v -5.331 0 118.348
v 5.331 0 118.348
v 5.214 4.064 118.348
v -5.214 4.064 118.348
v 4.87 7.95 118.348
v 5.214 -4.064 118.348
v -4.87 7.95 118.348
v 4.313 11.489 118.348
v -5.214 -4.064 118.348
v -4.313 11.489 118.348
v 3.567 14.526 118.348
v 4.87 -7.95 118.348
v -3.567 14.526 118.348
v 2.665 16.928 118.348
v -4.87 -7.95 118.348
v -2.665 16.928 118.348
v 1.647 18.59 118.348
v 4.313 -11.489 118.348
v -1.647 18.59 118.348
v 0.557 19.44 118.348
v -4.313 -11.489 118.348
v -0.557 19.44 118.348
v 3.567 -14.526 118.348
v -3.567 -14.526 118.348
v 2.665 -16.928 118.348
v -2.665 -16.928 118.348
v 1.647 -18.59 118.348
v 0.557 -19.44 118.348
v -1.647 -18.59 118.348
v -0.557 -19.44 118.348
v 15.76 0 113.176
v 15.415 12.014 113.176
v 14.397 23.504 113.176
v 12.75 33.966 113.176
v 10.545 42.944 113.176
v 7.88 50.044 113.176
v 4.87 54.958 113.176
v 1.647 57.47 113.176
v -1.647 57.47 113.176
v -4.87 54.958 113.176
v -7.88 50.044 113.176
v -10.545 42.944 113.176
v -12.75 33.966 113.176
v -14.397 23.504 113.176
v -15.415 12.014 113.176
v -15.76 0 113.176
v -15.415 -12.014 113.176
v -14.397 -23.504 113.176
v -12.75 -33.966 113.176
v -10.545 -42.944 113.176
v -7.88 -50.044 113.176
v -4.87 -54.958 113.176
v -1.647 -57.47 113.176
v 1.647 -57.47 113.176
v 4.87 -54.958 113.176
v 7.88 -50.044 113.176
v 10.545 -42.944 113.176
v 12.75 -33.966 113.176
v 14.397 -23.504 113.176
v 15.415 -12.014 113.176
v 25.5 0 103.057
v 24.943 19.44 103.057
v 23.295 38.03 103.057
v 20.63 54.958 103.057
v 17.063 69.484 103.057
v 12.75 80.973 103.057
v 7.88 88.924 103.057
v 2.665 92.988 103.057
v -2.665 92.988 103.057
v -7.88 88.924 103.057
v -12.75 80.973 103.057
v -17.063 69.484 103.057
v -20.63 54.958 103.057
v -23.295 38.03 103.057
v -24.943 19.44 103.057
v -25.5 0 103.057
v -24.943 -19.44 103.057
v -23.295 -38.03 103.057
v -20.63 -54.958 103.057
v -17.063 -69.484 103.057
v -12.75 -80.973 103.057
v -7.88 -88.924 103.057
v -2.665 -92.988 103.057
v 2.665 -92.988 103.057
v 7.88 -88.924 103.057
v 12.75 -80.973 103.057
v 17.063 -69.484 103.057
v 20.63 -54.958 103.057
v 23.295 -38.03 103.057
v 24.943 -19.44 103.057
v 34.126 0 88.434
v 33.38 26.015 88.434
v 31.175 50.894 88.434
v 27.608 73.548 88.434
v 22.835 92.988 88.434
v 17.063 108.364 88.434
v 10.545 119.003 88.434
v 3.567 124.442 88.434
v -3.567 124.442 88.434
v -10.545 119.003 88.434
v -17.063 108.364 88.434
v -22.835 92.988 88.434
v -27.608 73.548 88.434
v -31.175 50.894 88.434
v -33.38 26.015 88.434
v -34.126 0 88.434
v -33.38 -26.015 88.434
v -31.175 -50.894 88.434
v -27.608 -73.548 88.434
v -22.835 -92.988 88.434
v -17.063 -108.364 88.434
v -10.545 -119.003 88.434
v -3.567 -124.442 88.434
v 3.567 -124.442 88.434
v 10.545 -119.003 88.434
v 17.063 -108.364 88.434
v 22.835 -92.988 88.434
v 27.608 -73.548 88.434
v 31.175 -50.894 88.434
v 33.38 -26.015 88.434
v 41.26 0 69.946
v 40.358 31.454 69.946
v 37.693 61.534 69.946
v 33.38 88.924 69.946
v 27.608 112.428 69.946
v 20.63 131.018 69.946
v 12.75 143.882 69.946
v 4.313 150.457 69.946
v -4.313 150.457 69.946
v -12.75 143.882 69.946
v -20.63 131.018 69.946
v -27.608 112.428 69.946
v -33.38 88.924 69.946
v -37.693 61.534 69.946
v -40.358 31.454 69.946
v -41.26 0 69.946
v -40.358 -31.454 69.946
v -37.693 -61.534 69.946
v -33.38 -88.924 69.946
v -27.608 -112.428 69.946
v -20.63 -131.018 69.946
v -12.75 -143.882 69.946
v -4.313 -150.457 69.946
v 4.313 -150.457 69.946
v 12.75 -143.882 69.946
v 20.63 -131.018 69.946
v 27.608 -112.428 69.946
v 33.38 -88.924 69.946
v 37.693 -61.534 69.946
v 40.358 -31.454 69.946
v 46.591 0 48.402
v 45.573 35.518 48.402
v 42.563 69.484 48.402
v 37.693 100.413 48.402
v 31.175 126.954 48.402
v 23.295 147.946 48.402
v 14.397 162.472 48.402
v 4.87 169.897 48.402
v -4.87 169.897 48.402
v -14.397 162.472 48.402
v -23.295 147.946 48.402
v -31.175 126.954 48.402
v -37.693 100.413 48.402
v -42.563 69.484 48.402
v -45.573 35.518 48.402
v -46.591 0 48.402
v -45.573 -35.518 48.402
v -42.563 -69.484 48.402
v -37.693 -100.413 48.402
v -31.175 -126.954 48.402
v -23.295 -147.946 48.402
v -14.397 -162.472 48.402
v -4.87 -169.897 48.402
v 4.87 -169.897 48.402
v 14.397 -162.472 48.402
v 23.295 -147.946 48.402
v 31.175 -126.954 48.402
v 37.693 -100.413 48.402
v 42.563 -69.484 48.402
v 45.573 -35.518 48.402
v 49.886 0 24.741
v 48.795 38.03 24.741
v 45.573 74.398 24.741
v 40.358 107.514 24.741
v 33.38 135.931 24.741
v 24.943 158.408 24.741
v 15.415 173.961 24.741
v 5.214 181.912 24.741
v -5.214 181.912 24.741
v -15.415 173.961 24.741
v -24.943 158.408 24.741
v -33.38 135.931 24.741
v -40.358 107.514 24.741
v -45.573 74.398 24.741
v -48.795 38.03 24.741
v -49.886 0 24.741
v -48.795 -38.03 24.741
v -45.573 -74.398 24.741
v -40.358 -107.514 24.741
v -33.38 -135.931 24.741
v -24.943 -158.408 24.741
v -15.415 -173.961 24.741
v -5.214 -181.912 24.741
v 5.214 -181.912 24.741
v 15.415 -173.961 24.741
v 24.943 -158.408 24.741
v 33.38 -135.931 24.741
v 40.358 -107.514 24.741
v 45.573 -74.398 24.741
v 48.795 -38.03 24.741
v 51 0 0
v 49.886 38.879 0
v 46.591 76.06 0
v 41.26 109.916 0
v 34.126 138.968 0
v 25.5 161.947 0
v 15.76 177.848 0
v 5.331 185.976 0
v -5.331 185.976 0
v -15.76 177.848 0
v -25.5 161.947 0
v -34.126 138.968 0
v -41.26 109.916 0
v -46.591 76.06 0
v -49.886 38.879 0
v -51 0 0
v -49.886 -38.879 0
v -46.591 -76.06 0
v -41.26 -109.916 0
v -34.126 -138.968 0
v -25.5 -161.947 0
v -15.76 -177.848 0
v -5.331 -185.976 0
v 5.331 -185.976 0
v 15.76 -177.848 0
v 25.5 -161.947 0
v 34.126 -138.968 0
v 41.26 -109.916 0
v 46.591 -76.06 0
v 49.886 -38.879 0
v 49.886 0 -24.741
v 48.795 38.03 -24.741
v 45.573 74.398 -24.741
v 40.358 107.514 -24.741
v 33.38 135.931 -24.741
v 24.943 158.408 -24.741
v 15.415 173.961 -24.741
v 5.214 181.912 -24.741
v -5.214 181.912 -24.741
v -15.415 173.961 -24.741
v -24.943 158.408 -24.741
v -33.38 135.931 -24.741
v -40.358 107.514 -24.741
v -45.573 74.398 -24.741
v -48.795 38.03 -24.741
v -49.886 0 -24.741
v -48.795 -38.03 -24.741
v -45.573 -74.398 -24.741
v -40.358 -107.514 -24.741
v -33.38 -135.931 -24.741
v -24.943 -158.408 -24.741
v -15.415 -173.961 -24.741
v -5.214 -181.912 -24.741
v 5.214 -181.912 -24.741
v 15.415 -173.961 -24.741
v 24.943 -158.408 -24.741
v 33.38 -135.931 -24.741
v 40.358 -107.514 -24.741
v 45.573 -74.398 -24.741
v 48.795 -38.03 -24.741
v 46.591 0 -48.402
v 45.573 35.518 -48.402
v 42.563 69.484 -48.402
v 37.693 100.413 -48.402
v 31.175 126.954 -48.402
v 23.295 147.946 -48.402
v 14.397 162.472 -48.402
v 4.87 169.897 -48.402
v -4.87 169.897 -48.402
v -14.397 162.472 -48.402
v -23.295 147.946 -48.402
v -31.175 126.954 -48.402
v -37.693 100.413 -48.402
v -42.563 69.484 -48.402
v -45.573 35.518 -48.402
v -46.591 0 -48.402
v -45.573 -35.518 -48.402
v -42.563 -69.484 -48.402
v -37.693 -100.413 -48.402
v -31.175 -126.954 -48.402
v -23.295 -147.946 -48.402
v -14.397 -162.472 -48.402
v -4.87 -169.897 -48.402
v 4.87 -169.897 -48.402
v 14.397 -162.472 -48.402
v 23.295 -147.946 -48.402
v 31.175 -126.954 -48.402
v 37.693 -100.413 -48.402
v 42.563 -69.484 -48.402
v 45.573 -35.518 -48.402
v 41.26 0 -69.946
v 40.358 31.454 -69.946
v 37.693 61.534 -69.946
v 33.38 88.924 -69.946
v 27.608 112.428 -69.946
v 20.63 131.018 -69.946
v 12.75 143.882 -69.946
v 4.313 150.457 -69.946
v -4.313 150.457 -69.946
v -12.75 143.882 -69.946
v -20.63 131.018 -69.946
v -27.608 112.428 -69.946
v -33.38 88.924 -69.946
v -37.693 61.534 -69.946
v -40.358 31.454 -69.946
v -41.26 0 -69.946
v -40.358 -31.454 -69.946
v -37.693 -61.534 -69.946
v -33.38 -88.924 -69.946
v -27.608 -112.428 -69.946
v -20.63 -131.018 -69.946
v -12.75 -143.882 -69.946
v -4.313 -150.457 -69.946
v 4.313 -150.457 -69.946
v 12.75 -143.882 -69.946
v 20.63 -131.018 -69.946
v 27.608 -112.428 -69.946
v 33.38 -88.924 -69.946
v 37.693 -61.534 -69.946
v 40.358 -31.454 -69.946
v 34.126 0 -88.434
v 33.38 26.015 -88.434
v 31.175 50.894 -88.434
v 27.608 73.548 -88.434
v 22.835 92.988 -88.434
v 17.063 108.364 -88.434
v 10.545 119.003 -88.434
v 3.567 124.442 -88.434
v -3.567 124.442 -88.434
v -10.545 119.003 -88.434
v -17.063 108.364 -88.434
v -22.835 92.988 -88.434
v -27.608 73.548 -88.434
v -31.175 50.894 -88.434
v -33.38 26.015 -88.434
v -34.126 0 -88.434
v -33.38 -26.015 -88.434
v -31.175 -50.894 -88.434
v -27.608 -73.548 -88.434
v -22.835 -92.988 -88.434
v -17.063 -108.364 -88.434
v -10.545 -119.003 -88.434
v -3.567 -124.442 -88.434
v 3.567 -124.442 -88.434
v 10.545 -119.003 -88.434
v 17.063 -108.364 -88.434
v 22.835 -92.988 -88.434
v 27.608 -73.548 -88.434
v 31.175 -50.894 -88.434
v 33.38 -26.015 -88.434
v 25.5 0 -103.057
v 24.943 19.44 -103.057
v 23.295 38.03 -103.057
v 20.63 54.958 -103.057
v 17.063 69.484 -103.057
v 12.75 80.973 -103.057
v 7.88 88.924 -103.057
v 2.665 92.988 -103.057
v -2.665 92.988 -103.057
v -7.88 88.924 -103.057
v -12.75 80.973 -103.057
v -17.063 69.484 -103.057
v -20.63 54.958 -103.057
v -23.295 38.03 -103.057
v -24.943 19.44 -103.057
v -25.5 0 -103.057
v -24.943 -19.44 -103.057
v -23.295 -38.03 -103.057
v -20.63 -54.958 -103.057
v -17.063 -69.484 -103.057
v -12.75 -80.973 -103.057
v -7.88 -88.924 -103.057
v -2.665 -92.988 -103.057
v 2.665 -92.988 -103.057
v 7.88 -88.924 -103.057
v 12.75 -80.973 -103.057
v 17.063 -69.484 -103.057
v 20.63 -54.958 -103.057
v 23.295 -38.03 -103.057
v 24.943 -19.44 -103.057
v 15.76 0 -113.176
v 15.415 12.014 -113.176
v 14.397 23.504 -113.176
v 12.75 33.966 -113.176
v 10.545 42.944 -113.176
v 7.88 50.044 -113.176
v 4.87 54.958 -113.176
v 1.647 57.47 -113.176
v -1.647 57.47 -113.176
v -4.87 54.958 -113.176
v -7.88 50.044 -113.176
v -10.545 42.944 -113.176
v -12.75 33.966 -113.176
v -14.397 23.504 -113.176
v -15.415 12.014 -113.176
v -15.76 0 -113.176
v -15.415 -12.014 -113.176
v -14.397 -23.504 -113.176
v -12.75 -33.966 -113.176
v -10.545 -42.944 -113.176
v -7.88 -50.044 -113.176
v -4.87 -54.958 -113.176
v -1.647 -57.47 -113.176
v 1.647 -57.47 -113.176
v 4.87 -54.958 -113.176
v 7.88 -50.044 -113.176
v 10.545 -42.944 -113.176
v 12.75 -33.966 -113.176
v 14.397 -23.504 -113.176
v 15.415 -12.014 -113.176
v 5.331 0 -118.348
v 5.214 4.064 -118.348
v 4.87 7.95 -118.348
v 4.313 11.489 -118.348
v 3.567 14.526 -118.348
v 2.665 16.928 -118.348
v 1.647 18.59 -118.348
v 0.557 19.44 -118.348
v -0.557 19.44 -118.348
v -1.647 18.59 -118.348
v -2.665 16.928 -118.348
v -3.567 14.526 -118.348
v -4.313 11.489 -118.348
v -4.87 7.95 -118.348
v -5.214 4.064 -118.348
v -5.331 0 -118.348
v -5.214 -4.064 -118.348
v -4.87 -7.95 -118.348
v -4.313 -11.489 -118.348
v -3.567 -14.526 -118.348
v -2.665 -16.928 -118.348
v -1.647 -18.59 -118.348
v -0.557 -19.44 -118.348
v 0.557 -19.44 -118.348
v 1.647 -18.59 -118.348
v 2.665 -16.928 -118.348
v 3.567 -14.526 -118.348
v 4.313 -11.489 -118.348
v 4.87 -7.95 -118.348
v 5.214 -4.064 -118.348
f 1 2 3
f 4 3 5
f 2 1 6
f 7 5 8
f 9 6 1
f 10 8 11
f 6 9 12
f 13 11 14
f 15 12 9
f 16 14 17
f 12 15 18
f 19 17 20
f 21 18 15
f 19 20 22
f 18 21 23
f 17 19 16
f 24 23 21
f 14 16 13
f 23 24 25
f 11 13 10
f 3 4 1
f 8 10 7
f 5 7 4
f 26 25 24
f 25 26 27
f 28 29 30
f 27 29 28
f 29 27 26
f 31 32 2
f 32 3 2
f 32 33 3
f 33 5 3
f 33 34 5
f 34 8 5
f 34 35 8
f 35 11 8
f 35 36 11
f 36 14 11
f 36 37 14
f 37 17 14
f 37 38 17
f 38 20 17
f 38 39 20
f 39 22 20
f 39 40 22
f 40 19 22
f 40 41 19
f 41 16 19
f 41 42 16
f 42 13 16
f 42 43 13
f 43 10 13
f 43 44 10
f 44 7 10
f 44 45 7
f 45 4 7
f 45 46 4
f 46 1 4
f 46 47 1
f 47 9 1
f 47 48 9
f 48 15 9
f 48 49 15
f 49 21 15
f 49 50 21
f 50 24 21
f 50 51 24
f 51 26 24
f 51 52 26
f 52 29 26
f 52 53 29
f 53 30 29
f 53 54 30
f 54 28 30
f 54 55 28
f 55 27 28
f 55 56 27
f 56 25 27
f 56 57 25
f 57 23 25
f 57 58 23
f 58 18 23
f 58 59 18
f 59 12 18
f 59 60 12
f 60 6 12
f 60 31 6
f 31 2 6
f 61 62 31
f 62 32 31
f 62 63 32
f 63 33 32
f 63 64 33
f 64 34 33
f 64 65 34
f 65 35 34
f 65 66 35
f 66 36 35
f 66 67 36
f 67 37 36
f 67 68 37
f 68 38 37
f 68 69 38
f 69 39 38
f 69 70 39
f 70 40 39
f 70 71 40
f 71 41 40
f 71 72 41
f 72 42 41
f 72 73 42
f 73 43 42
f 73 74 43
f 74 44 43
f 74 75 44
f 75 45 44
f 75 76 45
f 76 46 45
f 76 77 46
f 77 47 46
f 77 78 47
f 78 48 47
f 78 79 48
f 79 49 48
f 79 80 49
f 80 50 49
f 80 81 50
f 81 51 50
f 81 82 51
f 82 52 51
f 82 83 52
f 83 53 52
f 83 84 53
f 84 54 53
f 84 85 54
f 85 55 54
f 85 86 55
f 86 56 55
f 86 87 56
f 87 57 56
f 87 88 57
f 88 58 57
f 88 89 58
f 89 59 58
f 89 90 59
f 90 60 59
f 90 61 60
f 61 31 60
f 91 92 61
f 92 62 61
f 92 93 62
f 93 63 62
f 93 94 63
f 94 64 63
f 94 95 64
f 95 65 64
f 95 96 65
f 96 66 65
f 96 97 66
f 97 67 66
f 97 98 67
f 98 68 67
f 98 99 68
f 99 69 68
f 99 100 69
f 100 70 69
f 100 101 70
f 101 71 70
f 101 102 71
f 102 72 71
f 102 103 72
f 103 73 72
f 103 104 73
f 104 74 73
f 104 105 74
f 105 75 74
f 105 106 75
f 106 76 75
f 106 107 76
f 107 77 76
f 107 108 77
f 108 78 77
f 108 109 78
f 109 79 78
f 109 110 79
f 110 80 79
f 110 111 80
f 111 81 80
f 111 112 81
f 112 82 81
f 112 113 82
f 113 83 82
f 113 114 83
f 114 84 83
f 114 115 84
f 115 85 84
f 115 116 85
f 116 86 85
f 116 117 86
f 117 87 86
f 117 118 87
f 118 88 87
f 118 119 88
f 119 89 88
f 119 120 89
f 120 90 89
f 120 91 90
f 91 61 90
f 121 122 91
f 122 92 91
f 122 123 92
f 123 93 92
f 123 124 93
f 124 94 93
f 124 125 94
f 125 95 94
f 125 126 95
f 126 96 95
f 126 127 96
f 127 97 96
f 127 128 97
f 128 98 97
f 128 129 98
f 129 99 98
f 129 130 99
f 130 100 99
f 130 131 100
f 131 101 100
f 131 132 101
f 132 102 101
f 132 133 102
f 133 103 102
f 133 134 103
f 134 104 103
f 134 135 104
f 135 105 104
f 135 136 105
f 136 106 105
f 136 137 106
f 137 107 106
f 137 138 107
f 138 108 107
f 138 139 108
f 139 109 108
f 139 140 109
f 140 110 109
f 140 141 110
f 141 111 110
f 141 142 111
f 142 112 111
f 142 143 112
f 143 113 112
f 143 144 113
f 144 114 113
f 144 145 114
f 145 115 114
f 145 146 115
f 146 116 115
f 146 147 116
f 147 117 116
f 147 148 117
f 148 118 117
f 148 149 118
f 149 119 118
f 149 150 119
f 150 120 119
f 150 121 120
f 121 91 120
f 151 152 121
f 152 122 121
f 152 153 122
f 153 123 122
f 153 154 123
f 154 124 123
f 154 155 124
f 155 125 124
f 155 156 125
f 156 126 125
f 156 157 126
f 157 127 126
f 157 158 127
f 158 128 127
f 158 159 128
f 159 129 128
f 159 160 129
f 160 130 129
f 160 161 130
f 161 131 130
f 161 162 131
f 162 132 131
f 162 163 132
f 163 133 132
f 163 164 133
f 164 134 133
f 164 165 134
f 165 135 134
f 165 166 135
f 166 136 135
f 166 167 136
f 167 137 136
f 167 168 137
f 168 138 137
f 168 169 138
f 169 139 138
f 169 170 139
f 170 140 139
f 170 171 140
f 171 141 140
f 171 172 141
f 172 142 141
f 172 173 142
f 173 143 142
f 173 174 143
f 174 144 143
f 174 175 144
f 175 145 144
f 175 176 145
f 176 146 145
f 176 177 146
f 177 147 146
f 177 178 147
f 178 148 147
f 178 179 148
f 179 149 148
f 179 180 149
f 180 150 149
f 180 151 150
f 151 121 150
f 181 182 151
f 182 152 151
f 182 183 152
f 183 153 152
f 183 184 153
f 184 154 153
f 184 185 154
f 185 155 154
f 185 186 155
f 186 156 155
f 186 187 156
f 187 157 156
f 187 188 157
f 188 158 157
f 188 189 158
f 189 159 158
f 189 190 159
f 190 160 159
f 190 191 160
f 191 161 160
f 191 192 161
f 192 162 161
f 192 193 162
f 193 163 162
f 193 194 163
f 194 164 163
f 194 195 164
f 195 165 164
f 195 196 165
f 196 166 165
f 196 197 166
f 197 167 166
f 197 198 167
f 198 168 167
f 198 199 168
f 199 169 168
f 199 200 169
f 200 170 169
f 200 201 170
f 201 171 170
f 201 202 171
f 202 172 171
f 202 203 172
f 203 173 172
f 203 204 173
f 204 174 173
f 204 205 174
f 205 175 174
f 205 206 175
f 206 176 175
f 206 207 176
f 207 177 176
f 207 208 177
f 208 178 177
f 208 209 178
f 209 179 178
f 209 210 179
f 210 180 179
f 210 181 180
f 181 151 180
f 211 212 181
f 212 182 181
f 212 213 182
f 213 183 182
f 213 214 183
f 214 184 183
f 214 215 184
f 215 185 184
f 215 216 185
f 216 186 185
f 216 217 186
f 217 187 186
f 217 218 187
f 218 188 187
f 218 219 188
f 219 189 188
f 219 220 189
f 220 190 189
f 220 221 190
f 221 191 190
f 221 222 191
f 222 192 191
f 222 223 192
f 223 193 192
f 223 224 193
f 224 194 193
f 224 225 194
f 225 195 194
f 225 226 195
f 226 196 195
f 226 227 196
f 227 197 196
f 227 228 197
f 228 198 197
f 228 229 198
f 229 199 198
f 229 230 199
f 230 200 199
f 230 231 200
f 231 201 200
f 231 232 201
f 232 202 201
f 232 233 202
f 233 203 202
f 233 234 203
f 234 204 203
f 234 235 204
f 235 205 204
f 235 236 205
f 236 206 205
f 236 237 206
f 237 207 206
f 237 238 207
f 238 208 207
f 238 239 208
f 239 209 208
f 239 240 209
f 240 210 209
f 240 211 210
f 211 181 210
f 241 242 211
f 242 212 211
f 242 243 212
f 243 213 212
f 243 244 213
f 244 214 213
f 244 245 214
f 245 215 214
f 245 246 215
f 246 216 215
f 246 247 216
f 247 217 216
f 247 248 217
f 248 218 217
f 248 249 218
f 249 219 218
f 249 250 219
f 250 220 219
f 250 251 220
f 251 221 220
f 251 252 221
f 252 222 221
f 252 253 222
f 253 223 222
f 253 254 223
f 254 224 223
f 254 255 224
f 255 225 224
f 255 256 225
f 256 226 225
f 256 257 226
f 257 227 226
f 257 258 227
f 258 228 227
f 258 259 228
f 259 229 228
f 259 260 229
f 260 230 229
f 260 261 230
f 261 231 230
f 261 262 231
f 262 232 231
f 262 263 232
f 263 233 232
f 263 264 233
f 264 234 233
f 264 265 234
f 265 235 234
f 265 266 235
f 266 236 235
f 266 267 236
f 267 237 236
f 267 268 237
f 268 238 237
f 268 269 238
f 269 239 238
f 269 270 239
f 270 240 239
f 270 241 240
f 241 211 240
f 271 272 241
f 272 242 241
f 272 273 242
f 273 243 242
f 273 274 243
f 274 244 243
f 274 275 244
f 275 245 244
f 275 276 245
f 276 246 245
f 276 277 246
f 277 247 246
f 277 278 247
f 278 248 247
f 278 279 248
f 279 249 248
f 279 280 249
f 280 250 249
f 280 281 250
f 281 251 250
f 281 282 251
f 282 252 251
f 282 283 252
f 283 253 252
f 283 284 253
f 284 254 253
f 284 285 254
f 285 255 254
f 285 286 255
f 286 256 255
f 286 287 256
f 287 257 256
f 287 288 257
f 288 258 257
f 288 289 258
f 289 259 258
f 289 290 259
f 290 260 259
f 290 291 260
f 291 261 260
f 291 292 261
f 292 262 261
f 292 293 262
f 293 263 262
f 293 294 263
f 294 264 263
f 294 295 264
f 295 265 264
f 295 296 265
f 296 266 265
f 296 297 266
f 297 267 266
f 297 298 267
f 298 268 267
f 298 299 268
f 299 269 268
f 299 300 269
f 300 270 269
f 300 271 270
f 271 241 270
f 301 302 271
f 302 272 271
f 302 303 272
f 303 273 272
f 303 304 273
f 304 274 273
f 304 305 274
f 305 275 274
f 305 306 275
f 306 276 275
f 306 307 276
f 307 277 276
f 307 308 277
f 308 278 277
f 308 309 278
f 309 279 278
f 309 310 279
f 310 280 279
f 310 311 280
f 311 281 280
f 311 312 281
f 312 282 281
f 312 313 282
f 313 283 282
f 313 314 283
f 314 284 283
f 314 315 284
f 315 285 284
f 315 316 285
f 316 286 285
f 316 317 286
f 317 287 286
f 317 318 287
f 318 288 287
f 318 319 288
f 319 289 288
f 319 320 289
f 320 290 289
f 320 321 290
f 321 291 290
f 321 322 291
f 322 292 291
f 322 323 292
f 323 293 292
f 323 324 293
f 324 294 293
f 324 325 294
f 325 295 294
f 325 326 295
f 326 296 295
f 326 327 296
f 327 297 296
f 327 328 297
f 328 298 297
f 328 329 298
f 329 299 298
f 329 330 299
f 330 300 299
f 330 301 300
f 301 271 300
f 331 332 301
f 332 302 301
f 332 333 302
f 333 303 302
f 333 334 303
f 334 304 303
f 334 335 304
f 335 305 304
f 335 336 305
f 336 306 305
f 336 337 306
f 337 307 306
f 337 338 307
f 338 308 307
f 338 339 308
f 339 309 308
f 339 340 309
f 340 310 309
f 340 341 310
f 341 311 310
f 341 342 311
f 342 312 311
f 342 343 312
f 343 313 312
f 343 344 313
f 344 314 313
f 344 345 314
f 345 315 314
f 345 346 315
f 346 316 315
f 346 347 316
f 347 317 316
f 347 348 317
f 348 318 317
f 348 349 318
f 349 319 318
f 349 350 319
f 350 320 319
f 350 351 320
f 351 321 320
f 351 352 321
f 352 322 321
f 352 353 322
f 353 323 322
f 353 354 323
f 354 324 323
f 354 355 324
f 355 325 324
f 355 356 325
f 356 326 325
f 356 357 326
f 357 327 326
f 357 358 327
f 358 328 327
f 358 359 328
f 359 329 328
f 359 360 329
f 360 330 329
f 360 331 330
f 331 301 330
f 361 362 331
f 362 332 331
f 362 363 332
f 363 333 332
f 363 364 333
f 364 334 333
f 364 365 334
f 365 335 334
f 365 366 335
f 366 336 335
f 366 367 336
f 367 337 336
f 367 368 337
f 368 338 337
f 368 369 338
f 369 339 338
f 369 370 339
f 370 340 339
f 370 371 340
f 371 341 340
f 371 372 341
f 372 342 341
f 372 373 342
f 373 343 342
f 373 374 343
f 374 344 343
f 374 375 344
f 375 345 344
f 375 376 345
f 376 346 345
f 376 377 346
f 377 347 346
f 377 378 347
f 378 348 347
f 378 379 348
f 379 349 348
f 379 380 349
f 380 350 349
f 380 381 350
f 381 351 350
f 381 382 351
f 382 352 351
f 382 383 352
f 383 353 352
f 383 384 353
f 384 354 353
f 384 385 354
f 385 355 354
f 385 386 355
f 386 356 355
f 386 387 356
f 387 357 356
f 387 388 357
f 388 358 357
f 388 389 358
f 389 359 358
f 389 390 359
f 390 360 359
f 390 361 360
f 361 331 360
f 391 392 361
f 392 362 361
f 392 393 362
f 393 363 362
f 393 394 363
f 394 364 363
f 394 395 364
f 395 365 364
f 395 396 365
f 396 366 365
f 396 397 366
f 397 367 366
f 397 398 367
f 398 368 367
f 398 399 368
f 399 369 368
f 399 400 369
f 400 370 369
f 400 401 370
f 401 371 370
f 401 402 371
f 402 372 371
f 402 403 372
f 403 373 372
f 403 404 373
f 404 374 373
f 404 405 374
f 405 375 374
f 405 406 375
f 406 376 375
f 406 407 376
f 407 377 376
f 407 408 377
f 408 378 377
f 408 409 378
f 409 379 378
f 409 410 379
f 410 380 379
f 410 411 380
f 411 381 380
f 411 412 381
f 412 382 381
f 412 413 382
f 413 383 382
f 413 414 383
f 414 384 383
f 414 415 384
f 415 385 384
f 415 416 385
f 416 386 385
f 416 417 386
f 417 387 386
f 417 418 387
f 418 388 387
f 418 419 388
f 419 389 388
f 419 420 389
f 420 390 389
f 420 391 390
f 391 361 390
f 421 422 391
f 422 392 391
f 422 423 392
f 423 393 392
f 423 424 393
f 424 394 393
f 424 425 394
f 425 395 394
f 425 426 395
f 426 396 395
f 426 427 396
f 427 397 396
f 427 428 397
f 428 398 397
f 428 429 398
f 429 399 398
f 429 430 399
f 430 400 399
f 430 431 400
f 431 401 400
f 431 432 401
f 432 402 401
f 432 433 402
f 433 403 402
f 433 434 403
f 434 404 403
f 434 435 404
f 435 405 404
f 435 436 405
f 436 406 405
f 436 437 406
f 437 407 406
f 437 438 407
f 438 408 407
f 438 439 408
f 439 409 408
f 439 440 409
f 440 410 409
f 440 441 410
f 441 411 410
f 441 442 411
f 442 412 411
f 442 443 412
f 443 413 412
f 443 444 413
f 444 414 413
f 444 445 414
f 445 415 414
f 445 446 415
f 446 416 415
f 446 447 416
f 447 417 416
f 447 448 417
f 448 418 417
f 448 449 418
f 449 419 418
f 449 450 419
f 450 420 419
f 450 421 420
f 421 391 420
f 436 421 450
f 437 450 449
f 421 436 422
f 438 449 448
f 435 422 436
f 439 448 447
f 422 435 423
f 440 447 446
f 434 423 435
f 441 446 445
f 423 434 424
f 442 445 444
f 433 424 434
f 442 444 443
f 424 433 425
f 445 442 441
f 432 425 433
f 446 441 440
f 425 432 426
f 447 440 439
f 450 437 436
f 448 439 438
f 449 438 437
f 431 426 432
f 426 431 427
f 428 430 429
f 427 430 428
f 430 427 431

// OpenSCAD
// Generated by SolidPython 1.0.1 on 2020-07-29 00:46:45


scale(v = [3, 11, 7]) {
	sphere(r = 17);
}
/***********************************************
*********      SolidPython code:      **********
************************************************
 
# import packages: SolidPython
from solid import *
from solid.utils import *
from itertools import chain, combinations, permutations


class Resize:

    def __init__(self, scad_file):
        self.scad_file = scad_file
        #self.scad_file = import_scad(scad_file)
        # cone/cylinder param:
        self.r1 = 0
        self.r2 = 0
        self.h = 0
        # rectangular prism param:
        self.w = 0
        self.l = 0
        # ellipse param:
        self.r = 0

    # import OpenScad code (file name corresponds to shape)


    # classify shape + parameters
    def assign(self, param1, param2, param3):
        if self.scad_file == 'cone.scad':
            self.r1 = param1
            self.r2 = param2
            self.h = param3
        elif self.scad_file == 'cylinder.scad':
            self.r1 = param1
            self.r2 = param2
            self.h = param3
        elif self.scad_file == 'rectangularPrism.scad':
            self.h = param1
            self.l = param2
            self.w = param3
        else:
            self.r = param1
            self.h = param2

    # resize parameters
    def iterate(self):
        x = range(3, 20, 2)
        i = 1
        if self.scad_file == 'cone.scad':
            tempList = list(permutations(x, 2))
            for temp in tempList:
                param1 = temp[0]
                param2 = temp[1]
                filepath = 'produced_scad_files/' + 'cone' + str(param1) + '_' + str(param2) + '_' + '.scad'
                scad_render_to_file(cylinder(h=param1, r1=param2, r2=0), filepath)

        elif self.scad_file == 'cylinder.scad':
            tempList = list(permutations(x, 3))
            for temp in tempList:
                param1 = temp[0]
                param2 = temp[1]
                filepath = 'produced_scad_files/' + 'cylinder' + str(param1) + '_' + str(param2) + '_' + '.scad'
                scad_render_to_file(cylinder(h=param1, r1=param2, r2=param2), filepath)

        elif self.scad_file == 'rectangularPrism.scad':
            tempList = list(permutations(x, 3))
            for temp in tempList:
                param1 = temp[0]
                param2 = temp[1]
                param3 = temp[2]
                filepath = 'produced_scad_files/' + 'rectangularPrism' + str(param1) + '_' + str(param2) + '_' + str(
                    param3) + '.scad'
                scad_render_to_file(cube(size=(param1, param2, param3)), filepath)

        elif self.scad_file == 'ellipse.scad':
            tempList = list(permutations(x, 4))
            for temp in tempList:
                param1 = temp[0]
                param2 = temp[1]
                param3 = temp[2]
                param4 = temp[3]
                filepath = 'produced_scad_files/' + 'ellipse' + str(param1) + '_' + str(param2) + '_' + str(param3) + '_' + str(param4) + '.scad'
                scad_render_to_file(scale([param1, param2, param3])(sphere(r=param4)), filepath)

    def render_to_scadfile(self):
        scad_render_to_file(scad, 'example.scad') 
 
************************************************/
